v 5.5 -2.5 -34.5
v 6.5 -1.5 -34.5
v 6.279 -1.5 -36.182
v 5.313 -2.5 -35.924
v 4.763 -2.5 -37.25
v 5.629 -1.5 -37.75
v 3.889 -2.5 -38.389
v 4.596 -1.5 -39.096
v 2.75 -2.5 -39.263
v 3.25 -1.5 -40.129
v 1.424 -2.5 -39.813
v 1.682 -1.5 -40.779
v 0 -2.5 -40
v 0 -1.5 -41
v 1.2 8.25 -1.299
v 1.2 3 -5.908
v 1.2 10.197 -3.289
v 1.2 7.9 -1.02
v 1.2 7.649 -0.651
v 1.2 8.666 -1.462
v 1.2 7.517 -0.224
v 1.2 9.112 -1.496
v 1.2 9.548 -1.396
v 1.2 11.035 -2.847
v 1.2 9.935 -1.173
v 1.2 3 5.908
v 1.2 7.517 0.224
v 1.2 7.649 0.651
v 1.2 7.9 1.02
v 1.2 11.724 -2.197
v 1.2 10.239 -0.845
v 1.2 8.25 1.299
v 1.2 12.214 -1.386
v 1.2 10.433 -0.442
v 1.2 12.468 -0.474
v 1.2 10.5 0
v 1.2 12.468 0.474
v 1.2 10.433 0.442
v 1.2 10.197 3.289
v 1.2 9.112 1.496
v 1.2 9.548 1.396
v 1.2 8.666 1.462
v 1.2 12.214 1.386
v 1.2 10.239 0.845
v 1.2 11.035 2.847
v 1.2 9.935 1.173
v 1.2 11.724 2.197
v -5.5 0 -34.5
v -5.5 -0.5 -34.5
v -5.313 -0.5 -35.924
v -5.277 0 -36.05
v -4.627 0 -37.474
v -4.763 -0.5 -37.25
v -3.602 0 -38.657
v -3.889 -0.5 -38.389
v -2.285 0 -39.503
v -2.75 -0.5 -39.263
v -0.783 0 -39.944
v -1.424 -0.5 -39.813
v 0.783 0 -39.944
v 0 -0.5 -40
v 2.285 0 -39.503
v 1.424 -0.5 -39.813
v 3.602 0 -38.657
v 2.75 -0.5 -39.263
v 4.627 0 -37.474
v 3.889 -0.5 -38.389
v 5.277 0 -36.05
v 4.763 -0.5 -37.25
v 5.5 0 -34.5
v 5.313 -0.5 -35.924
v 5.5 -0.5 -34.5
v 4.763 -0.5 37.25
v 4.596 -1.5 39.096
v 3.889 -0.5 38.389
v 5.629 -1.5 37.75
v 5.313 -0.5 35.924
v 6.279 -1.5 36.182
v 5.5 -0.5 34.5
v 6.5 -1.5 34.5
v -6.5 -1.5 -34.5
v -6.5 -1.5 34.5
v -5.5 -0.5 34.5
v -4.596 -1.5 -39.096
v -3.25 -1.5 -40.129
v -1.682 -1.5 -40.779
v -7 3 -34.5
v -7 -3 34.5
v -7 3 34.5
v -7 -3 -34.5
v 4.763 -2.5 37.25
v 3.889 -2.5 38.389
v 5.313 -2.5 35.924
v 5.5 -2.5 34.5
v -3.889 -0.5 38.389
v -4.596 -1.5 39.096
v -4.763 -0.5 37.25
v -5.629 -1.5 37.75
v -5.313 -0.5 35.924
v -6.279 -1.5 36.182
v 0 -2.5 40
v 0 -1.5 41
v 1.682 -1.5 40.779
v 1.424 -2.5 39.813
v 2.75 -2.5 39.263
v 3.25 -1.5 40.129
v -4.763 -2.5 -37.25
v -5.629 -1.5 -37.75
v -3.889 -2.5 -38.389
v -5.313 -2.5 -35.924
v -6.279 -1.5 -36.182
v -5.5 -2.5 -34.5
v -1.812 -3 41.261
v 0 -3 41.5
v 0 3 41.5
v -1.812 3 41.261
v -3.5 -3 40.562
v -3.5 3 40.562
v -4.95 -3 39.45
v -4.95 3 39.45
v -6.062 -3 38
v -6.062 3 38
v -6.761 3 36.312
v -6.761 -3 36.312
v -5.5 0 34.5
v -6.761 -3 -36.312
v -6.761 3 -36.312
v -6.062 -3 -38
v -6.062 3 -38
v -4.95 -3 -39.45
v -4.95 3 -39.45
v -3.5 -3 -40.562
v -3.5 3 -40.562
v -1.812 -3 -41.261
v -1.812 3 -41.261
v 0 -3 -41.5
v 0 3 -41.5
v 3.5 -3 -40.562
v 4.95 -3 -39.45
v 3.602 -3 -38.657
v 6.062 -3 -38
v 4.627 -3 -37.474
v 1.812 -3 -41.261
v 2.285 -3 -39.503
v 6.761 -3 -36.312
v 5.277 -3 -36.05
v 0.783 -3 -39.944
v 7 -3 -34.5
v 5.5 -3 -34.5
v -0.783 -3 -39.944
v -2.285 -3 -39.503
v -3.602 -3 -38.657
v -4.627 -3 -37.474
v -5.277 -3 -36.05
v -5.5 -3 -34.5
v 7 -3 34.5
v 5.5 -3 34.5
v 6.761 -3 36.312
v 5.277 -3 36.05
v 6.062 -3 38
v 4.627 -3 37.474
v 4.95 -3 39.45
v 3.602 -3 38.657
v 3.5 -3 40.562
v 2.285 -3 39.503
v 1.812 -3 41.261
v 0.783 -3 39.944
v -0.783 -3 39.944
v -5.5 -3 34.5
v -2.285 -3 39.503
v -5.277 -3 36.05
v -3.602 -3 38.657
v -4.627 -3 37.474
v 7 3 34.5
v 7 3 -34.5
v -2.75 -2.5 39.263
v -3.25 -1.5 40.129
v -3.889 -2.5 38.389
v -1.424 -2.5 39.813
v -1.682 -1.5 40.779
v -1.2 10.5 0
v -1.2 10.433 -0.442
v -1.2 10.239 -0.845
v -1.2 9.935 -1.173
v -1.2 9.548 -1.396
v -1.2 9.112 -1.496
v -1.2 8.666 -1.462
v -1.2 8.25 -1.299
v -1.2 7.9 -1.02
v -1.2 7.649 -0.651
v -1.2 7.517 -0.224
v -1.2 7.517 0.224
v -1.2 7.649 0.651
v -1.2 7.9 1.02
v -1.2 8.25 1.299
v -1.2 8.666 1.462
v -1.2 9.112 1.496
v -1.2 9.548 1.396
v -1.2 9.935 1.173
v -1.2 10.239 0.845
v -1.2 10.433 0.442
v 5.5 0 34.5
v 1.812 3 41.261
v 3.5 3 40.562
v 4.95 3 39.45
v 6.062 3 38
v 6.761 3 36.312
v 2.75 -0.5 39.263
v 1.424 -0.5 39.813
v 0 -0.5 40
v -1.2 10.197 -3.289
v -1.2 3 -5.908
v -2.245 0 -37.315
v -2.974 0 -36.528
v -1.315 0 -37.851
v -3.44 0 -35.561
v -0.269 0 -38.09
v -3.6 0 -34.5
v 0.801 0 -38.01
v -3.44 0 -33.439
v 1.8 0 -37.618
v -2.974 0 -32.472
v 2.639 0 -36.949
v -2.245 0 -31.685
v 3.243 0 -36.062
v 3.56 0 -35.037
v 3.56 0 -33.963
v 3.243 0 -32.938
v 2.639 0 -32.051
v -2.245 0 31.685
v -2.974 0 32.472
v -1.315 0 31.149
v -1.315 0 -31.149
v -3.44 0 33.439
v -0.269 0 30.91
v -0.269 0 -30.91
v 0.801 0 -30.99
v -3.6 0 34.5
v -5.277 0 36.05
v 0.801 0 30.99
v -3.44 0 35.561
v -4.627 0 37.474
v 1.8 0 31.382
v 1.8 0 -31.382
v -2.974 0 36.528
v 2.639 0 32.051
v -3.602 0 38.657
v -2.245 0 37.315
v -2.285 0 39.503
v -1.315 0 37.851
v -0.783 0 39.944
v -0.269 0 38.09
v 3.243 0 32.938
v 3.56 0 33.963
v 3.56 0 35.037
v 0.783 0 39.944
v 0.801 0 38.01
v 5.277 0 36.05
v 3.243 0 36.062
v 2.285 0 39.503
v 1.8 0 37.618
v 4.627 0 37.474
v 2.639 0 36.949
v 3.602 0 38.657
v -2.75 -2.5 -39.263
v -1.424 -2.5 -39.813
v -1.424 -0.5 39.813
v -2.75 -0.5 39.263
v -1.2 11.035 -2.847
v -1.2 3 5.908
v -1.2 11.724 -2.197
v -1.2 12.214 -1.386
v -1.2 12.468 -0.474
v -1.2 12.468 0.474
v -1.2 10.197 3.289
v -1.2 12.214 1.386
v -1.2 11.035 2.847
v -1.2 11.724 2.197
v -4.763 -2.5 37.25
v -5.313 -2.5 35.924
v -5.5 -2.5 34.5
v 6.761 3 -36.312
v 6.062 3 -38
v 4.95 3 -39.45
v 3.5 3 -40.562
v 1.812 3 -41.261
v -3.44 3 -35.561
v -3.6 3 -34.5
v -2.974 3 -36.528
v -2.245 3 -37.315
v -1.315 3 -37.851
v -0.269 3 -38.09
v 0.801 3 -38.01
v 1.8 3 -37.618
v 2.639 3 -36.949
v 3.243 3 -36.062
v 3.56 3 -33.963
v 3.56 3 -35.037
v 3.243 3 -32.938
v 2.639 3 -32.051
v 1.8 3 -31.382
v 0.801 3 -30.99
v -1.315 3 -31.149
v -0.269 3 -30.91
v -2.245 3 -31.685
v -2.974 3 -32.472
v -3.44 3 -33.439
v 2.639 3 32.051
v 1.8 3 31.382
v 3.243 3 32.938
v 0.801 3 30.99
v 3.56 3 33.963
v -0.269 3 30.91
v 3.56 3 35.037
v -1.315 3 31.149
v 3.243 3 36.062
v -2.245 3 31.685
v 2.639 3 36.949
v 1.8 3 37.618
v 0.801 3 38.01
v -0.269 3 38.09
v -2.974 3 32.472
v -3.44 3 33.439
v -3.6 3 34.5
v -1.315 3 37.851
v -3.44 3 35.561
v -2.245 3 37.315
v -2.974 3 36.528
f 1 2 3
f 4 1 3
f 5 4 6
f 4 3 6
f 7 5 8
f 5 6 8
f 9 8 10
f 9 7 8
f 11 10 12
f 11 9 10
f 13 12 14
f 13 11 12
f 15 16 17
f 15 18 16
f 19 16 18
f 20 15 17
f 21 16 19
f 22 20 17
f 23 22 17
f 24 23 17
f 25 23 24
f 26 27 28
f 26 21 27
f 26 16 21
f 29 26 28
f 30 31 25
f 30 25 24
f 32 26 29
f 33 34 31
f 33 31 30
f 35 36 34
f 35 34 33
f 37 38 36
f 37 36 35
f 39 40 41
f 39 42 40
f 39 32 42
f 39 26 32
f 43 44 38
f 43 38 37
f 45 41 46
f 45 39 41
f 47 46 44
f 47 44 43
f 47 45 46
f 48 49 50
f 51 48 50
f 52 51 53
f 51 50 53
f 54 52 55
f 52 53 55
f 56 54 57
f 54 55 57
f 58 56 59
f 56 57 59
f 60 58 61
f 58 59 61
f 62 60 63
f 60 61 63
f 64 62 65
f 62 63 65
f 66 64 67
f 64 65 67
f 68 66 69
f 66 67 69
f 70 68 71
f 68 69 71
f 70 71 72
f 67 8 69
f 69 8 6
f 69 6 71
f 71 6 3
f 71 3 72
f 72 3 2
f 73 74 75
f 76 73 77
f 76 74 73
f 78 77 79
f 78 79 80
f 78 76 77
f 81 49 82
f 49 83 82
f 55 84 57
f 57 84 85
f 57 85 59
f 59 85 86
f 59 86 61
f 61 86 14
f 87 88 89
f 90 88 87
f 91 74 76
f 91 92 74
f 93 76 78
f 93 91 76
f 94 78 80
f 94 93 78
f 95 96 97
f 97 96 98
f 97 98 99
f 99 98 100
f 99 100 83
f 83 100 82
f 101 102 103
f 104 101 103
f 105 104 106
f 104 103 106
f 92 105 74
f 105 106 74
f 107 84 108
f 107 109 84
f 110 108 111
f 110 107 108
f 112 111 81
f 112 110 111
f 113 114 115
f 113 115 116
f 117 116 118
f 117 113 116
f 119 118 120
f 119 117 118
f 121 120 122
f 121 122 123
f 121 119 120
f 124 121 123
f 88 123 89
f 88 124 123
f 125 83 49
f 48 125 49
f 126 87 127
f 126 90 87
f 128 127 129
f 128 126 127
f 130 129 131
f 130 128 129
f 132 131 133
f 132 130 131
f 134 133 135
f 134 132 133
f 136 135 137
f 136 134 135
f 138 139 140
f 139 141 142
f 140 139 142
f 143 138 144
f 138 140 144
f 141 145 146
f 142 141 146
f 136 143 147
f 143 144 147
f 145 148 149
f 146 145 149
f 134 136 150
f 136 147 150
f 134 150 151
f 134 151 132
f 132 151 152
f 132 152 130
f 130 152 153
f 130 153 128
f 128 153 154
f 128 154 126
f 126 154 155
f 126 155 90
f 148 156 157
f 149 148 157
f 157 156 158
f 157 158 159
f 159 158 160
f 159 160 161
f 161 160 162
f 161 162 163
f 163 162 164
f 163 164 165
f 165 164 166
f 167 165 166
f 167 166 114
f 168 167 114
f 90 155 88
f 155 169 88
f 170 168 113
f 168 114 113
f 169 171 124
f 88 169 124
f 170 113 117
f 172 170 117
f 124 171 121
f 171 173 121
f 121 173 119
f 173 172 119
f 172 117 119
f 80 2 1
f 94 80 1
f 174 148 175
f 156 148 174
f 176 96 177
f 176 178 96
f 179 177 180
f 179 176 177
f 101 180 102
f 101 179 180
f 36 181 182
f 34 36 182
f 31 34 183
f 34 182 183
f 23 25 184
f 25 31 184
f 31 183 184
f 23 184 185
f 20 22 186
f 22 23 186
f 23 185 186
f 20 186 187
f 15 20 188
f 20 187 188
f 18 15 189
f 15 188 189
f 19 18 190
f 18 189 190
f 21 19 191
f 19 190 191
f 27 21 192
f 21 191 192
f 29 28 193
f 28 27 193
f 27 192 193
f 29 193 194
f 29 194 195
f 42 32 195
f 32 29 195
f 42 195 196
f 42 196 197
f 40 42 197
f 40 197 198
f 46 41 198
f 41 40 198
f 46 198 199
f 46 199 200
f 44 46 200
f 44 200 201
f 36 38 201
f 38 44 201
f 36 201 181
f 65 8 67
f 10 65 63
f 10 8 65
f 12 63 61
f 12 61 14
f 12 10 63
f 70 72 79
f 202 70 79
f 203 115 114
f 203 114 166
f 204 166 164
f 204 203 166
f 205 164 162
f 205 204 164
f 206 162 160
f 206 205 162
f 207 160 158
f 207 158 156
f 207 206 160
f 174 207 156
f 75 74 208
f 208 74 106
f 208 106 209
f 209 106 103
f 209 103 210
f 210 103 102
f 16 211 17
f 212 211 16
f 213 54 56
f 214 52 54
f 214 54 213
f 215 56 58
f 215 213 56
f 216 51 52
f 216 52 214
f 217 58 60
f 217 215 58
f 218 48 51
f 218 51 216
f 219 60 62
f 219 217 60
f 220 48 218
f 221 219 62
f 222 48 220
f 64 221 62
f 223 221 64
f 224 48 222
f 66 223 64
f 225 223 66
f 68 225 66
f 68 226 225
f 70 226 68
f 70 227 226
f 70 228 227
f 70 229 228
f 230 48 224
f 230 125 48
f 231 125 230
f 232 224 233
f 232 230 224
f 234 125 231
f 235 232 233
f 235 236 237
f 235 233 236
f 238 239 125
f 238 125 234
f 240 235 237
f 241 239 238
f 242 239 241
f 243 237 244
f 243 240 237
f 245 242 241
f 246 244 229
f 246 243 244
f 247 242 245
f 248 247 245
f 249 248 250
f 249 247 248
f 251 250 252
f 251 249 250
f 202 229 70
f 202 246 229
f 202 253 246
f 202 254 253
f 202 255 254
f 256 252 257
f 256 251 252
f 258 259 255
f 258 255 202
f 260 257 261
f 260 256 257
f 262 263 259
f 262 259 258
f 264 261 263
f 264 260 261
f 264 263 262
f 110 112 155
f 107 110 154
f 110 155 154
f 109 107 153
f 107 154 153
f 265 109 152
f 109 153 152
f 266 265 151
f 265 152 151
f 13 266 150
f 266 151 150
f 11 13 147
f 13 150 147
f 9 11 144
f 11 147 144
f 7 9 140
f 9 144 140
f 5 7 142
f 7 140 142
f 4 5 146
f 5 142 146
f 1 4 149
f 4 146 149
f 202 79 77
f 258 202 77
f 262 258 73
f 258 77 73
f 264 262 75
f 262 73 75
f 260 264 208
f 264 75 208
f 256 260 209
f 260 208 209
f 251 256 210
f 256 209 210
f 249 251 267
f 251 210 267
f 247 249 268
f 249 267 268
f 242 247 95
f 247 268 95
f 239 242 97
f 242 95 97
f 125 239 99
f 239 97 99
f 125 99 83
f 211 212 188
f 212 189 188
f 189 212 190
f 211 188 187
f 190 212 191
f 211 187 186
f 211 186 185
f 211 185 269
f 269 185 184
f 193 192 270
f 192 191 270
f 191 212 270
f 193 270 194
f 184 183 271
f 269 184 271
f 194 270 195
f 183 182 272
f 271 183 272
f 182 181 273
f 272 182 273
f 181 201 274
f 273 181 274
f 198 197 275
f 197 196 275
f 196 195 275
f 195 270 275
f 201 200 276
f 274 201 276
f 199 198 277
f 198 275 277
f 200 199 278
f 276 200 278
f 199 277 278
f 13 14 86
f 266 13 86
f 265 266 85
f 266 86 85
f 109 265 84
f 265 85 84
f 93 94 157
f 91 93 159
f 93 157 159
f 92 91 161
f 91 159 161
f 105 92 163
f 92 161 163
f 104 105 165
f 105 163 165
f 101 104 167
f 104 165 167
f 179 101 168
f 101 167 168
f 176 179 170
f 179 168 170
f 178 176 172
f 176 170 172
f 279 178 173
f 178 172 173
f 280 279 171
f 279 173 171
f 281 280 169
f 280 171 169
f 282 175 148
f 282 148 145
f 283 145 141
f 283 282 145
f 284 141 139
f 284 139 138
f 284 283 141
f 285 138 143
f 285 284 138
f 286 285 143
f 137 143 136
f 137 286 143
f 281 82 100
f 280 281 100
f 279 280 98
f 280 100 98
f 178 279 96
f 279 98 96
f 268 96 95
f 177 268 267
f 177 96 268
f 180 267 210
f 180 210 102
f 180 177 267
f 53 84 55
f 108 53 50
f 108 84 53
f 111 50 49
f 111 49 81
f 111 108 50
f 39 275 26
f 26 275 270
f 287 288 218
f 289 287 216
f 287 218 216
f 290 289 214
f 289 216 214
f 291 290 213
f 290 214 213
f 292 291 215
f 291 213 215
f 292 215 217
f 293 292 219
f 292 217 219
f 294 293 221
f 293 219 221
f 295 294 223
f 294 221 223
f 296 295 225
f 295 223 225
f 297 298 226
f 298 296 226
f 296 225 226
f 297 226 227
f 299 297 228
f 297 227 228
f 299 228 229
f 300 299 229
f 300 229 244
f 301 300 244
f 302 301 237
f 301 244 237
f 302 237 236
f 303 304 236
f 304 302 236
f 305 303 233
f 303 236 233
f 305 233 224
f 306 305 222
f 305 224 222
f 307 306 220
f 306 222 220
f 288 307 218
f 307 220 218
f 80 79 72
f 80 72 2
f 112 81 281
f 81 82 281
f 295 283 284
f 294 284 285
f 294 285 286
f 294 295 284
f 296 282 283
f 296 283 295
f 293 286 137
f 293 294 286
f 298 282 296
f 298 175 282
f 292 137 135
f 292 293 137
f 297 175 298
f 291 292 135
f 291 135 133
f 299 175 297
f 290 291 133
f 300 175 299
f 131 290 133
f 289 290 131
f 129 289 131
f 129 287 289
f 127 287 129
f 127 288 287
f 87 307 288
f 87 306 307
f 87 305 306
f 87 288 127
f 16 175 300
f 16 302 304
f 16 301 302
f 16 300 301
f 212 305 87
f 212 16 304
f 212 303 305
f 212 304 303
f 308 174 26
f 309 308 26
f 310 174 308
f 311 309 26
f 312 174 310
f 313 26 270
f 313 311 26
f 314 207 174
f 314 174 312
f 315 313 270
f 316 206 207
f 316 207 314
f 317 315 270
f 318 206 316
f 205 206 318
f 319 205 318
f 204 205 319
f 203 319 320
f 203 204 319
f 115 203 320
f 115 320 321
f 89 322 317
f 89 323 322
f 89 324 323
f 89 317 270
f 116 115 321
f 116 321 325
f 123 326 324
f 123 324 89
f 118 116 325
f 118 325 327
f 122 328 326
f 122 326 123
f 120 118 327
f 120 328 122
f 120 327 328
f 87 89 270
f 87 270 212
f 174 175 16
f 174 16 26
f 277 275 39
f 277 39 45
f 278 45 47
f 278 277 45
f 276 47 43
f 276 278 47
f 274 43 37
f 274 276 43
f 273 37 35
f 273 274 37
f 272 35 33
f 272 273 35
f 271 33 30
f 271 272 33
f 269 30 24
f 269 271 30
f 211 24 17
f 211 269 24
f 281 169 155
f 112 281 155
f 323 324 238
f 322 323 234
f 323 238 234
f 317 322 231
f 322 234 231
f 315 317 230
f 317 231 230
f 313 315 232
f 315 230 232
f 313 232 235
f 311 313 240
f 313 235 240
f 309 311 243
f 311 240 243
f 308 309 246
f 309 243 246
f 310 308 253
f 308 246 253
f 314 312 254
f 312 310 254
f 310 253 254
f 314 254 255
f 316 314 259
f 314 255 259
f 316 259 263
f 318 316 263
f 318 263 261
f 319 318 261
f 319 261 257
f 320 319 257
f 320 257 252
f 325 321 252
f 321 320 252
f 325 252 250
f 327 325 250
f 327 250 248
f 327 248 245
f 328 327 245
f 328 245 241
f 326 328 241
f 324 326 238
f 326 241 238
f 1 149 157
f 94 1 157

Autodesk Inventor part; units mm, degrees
ref_plane "YZ Plane" through (0, 0, 0) normal (1, 0, 0) x (0, 1, 0)
ref_plane "XZ Plane" through (0, 0, 0) normal (0, 1, 0) x (-1, 0, 0)
ref_plane "XY Plane" through (0, 0, 0) normal (0, 0, 1) x (1, 0, 0)
sketch "Sketch1" plane through (0, 0, 0) normal (0, 1, 0) x (-1, 0, 0)
  line L0 (-7, 41.5) -> (7, 41.5)
  line L1 (7, 41.5) -> (7, -41.5)
  line L2 (7, -41.5) -> (-7, -41.5)
  line L3 (-7, -41.5) -> (-7, 41.5)
  line L4 (-7, 41.5) -> (7, -41.5) construction
  line L5 (7, 41.5) -> (-7, -41.5) construction
  circle A0 centre (0, 34.5) radius 3.6
  circle A1 centre (0, -34.5) radius 3.6
  line L6 (13.7936, 0) -> (-15.5073, 0) construction
  point P0 (0, 0)
  dimension "d0" = 7.2
  dimension "d1" = 69
  dimension "d2" = 83
  dimension "d3" = 14
extrude "Extrusion1" add sketch "Sketch1" along normal mid plane 6
sketch "Sketch2" plane through (0, 0, 0) normal (1, 0, 0) x (0, 1, 0)
  circle A0 centre (9, 0) radius 3.5
  line L0 (10.1971, -3.2889) -> (3, -5.9084)
  line L1 (3, -41.5) -> (3, 41.5) projected
  line L2 (10.1971, 3.2889) -> (3, 5.9084)
  line L3 (9, 0) -> (-7.9221, 0) construction
  circle A1 centre (9, 0) radius 1.5
  point P0 (0, 0)
  point P1 (16.3025, 1.2439)
  point P2 (5, 7.6173)
  point P3 (5, -5.09)
  point P4 (3, 0)
  dimension "d6" = 7
  dimension "d11" = 20
  dimension "d12" = 6
  dimension "d13" = 3
extrude "Extrusion2" add sketch "Sketch2" along normal mid plane 2.4
fillet "Fillet1" radius 7 4 edges at (-7, 0, 41.5) (7, 0, 41.5) (-7, 0, -41.5) (7, 0, -41.5)
sketch "Sketch5" plane through (0, -3, 0) normal (0, -1, 0) x (1, 0, 0)
  arc A0 (-7, -34.5) -> (7, -34.5) centre (0, -34.5) ccw projected
  arc A1 (-7, -34.5) -> (7, -34.5) centre (0, -34.5) ccw projected
  line L0 (7, -34.5) -> (7, 34.5) projected
  arc A2 (7, 34.5) -> (-7, 34.5) centre (0, 34.5) ccw projected
  line L1 (-7, 34.5) -> (-7, -34.5) projected
  circle A3 centre (0, 34.5) radius 3.6 projected
  circle A4 centre (0, -34.5) radius 3.6 projected
  arc A5 (-5.5, -34.5) -> (5.5, -34.5) centre (0, -34.5) ccw
  line L2 (5.5, -34.5) -> (5.5, 34.5)
  arc A6 (5.5, 34.5) -> (-5.5, 34.5) centre (0, 34.5) ccw
  line L3 (-5.5, 34.5) -> (-5.5, -34.5)
  point P0 (0, 0)
  dimension "d32" = 1.5
extrude "Extrusion5" cut sketch "Sketch5" against normal blind 3 contours L3 A6 L2 A5
sketch "Sketch7" plane through (0, 0, 0) normal (0, 0, 1) x (1, 0, 0)
  point P0 (0, 0)
sketch "Sketch8" plane through (0, 0, 0) normal (0, 0, 1) x (1, 0, 0)
  line L0 (-5.5, -2.5) -> (-6.5, -1.5)
  line L1 (-6.5, -1.5) -> (-5.5, -0.5)
  line L2 (-6.5, -1.5) -> (-5.5, -1.5) construction
  line L3 (-5.5, -3) -> (-5.5, 0) projected
  point P0 (0, 0)
  dimension "d38" = 1
  dimension "d39" = 45
  dimension "d42" = 0.5
sketch3d "3D Sketch1"
  arc A0 (5.5, -3, -34.5) -> (3.8891, -3, -38.3891) centre (0, -3, -34.5) ccw
  arc A1 (3.8891, -3, -38.3891) -> (0, -3, -40) centre (0, -3, -34.5) ccw
  arc A2 (0, -3, -40) -> (-3.8891, -3, -38.3891) centre (0, -3, -34.5) ccw
  arc A3 (-3.8891, -3, -38.3891) -> (-5.5, -3, -34.5) centre (0, -3, -34.5) ccw
  line L0 (5.5, -3, -34.5) -> (5.5, -3, 34.5)
  arc A4 (-5.5, -3, 34.5) -> (-3.8891, -3, 38.3891) centre (0, -3, 34.5) ccw
  arc A5 (-3.8891, -3, 38.3891) -> (0, -3, 40) centre (0, -3, 34.5) ccw
  arc A6 (0, -3, 40) -> (3.8891, -3, 38.3891) centre (0, -3, 34.5) ccw
  arc A7 (3.8891, -3, 38.3891) -> (5.5, -3, 34.5) centre (0, -3, 34.5) ccw
  line L1 (-5.5, -3, 34.5) -> (-5.5, -3, -34.5)
sweep "Sweep1" cut profiles "Sketch8" path "3D Sketch1"
equation "\"d10\" = 0.5 * d3"
properties part number "Gripper_arms"
